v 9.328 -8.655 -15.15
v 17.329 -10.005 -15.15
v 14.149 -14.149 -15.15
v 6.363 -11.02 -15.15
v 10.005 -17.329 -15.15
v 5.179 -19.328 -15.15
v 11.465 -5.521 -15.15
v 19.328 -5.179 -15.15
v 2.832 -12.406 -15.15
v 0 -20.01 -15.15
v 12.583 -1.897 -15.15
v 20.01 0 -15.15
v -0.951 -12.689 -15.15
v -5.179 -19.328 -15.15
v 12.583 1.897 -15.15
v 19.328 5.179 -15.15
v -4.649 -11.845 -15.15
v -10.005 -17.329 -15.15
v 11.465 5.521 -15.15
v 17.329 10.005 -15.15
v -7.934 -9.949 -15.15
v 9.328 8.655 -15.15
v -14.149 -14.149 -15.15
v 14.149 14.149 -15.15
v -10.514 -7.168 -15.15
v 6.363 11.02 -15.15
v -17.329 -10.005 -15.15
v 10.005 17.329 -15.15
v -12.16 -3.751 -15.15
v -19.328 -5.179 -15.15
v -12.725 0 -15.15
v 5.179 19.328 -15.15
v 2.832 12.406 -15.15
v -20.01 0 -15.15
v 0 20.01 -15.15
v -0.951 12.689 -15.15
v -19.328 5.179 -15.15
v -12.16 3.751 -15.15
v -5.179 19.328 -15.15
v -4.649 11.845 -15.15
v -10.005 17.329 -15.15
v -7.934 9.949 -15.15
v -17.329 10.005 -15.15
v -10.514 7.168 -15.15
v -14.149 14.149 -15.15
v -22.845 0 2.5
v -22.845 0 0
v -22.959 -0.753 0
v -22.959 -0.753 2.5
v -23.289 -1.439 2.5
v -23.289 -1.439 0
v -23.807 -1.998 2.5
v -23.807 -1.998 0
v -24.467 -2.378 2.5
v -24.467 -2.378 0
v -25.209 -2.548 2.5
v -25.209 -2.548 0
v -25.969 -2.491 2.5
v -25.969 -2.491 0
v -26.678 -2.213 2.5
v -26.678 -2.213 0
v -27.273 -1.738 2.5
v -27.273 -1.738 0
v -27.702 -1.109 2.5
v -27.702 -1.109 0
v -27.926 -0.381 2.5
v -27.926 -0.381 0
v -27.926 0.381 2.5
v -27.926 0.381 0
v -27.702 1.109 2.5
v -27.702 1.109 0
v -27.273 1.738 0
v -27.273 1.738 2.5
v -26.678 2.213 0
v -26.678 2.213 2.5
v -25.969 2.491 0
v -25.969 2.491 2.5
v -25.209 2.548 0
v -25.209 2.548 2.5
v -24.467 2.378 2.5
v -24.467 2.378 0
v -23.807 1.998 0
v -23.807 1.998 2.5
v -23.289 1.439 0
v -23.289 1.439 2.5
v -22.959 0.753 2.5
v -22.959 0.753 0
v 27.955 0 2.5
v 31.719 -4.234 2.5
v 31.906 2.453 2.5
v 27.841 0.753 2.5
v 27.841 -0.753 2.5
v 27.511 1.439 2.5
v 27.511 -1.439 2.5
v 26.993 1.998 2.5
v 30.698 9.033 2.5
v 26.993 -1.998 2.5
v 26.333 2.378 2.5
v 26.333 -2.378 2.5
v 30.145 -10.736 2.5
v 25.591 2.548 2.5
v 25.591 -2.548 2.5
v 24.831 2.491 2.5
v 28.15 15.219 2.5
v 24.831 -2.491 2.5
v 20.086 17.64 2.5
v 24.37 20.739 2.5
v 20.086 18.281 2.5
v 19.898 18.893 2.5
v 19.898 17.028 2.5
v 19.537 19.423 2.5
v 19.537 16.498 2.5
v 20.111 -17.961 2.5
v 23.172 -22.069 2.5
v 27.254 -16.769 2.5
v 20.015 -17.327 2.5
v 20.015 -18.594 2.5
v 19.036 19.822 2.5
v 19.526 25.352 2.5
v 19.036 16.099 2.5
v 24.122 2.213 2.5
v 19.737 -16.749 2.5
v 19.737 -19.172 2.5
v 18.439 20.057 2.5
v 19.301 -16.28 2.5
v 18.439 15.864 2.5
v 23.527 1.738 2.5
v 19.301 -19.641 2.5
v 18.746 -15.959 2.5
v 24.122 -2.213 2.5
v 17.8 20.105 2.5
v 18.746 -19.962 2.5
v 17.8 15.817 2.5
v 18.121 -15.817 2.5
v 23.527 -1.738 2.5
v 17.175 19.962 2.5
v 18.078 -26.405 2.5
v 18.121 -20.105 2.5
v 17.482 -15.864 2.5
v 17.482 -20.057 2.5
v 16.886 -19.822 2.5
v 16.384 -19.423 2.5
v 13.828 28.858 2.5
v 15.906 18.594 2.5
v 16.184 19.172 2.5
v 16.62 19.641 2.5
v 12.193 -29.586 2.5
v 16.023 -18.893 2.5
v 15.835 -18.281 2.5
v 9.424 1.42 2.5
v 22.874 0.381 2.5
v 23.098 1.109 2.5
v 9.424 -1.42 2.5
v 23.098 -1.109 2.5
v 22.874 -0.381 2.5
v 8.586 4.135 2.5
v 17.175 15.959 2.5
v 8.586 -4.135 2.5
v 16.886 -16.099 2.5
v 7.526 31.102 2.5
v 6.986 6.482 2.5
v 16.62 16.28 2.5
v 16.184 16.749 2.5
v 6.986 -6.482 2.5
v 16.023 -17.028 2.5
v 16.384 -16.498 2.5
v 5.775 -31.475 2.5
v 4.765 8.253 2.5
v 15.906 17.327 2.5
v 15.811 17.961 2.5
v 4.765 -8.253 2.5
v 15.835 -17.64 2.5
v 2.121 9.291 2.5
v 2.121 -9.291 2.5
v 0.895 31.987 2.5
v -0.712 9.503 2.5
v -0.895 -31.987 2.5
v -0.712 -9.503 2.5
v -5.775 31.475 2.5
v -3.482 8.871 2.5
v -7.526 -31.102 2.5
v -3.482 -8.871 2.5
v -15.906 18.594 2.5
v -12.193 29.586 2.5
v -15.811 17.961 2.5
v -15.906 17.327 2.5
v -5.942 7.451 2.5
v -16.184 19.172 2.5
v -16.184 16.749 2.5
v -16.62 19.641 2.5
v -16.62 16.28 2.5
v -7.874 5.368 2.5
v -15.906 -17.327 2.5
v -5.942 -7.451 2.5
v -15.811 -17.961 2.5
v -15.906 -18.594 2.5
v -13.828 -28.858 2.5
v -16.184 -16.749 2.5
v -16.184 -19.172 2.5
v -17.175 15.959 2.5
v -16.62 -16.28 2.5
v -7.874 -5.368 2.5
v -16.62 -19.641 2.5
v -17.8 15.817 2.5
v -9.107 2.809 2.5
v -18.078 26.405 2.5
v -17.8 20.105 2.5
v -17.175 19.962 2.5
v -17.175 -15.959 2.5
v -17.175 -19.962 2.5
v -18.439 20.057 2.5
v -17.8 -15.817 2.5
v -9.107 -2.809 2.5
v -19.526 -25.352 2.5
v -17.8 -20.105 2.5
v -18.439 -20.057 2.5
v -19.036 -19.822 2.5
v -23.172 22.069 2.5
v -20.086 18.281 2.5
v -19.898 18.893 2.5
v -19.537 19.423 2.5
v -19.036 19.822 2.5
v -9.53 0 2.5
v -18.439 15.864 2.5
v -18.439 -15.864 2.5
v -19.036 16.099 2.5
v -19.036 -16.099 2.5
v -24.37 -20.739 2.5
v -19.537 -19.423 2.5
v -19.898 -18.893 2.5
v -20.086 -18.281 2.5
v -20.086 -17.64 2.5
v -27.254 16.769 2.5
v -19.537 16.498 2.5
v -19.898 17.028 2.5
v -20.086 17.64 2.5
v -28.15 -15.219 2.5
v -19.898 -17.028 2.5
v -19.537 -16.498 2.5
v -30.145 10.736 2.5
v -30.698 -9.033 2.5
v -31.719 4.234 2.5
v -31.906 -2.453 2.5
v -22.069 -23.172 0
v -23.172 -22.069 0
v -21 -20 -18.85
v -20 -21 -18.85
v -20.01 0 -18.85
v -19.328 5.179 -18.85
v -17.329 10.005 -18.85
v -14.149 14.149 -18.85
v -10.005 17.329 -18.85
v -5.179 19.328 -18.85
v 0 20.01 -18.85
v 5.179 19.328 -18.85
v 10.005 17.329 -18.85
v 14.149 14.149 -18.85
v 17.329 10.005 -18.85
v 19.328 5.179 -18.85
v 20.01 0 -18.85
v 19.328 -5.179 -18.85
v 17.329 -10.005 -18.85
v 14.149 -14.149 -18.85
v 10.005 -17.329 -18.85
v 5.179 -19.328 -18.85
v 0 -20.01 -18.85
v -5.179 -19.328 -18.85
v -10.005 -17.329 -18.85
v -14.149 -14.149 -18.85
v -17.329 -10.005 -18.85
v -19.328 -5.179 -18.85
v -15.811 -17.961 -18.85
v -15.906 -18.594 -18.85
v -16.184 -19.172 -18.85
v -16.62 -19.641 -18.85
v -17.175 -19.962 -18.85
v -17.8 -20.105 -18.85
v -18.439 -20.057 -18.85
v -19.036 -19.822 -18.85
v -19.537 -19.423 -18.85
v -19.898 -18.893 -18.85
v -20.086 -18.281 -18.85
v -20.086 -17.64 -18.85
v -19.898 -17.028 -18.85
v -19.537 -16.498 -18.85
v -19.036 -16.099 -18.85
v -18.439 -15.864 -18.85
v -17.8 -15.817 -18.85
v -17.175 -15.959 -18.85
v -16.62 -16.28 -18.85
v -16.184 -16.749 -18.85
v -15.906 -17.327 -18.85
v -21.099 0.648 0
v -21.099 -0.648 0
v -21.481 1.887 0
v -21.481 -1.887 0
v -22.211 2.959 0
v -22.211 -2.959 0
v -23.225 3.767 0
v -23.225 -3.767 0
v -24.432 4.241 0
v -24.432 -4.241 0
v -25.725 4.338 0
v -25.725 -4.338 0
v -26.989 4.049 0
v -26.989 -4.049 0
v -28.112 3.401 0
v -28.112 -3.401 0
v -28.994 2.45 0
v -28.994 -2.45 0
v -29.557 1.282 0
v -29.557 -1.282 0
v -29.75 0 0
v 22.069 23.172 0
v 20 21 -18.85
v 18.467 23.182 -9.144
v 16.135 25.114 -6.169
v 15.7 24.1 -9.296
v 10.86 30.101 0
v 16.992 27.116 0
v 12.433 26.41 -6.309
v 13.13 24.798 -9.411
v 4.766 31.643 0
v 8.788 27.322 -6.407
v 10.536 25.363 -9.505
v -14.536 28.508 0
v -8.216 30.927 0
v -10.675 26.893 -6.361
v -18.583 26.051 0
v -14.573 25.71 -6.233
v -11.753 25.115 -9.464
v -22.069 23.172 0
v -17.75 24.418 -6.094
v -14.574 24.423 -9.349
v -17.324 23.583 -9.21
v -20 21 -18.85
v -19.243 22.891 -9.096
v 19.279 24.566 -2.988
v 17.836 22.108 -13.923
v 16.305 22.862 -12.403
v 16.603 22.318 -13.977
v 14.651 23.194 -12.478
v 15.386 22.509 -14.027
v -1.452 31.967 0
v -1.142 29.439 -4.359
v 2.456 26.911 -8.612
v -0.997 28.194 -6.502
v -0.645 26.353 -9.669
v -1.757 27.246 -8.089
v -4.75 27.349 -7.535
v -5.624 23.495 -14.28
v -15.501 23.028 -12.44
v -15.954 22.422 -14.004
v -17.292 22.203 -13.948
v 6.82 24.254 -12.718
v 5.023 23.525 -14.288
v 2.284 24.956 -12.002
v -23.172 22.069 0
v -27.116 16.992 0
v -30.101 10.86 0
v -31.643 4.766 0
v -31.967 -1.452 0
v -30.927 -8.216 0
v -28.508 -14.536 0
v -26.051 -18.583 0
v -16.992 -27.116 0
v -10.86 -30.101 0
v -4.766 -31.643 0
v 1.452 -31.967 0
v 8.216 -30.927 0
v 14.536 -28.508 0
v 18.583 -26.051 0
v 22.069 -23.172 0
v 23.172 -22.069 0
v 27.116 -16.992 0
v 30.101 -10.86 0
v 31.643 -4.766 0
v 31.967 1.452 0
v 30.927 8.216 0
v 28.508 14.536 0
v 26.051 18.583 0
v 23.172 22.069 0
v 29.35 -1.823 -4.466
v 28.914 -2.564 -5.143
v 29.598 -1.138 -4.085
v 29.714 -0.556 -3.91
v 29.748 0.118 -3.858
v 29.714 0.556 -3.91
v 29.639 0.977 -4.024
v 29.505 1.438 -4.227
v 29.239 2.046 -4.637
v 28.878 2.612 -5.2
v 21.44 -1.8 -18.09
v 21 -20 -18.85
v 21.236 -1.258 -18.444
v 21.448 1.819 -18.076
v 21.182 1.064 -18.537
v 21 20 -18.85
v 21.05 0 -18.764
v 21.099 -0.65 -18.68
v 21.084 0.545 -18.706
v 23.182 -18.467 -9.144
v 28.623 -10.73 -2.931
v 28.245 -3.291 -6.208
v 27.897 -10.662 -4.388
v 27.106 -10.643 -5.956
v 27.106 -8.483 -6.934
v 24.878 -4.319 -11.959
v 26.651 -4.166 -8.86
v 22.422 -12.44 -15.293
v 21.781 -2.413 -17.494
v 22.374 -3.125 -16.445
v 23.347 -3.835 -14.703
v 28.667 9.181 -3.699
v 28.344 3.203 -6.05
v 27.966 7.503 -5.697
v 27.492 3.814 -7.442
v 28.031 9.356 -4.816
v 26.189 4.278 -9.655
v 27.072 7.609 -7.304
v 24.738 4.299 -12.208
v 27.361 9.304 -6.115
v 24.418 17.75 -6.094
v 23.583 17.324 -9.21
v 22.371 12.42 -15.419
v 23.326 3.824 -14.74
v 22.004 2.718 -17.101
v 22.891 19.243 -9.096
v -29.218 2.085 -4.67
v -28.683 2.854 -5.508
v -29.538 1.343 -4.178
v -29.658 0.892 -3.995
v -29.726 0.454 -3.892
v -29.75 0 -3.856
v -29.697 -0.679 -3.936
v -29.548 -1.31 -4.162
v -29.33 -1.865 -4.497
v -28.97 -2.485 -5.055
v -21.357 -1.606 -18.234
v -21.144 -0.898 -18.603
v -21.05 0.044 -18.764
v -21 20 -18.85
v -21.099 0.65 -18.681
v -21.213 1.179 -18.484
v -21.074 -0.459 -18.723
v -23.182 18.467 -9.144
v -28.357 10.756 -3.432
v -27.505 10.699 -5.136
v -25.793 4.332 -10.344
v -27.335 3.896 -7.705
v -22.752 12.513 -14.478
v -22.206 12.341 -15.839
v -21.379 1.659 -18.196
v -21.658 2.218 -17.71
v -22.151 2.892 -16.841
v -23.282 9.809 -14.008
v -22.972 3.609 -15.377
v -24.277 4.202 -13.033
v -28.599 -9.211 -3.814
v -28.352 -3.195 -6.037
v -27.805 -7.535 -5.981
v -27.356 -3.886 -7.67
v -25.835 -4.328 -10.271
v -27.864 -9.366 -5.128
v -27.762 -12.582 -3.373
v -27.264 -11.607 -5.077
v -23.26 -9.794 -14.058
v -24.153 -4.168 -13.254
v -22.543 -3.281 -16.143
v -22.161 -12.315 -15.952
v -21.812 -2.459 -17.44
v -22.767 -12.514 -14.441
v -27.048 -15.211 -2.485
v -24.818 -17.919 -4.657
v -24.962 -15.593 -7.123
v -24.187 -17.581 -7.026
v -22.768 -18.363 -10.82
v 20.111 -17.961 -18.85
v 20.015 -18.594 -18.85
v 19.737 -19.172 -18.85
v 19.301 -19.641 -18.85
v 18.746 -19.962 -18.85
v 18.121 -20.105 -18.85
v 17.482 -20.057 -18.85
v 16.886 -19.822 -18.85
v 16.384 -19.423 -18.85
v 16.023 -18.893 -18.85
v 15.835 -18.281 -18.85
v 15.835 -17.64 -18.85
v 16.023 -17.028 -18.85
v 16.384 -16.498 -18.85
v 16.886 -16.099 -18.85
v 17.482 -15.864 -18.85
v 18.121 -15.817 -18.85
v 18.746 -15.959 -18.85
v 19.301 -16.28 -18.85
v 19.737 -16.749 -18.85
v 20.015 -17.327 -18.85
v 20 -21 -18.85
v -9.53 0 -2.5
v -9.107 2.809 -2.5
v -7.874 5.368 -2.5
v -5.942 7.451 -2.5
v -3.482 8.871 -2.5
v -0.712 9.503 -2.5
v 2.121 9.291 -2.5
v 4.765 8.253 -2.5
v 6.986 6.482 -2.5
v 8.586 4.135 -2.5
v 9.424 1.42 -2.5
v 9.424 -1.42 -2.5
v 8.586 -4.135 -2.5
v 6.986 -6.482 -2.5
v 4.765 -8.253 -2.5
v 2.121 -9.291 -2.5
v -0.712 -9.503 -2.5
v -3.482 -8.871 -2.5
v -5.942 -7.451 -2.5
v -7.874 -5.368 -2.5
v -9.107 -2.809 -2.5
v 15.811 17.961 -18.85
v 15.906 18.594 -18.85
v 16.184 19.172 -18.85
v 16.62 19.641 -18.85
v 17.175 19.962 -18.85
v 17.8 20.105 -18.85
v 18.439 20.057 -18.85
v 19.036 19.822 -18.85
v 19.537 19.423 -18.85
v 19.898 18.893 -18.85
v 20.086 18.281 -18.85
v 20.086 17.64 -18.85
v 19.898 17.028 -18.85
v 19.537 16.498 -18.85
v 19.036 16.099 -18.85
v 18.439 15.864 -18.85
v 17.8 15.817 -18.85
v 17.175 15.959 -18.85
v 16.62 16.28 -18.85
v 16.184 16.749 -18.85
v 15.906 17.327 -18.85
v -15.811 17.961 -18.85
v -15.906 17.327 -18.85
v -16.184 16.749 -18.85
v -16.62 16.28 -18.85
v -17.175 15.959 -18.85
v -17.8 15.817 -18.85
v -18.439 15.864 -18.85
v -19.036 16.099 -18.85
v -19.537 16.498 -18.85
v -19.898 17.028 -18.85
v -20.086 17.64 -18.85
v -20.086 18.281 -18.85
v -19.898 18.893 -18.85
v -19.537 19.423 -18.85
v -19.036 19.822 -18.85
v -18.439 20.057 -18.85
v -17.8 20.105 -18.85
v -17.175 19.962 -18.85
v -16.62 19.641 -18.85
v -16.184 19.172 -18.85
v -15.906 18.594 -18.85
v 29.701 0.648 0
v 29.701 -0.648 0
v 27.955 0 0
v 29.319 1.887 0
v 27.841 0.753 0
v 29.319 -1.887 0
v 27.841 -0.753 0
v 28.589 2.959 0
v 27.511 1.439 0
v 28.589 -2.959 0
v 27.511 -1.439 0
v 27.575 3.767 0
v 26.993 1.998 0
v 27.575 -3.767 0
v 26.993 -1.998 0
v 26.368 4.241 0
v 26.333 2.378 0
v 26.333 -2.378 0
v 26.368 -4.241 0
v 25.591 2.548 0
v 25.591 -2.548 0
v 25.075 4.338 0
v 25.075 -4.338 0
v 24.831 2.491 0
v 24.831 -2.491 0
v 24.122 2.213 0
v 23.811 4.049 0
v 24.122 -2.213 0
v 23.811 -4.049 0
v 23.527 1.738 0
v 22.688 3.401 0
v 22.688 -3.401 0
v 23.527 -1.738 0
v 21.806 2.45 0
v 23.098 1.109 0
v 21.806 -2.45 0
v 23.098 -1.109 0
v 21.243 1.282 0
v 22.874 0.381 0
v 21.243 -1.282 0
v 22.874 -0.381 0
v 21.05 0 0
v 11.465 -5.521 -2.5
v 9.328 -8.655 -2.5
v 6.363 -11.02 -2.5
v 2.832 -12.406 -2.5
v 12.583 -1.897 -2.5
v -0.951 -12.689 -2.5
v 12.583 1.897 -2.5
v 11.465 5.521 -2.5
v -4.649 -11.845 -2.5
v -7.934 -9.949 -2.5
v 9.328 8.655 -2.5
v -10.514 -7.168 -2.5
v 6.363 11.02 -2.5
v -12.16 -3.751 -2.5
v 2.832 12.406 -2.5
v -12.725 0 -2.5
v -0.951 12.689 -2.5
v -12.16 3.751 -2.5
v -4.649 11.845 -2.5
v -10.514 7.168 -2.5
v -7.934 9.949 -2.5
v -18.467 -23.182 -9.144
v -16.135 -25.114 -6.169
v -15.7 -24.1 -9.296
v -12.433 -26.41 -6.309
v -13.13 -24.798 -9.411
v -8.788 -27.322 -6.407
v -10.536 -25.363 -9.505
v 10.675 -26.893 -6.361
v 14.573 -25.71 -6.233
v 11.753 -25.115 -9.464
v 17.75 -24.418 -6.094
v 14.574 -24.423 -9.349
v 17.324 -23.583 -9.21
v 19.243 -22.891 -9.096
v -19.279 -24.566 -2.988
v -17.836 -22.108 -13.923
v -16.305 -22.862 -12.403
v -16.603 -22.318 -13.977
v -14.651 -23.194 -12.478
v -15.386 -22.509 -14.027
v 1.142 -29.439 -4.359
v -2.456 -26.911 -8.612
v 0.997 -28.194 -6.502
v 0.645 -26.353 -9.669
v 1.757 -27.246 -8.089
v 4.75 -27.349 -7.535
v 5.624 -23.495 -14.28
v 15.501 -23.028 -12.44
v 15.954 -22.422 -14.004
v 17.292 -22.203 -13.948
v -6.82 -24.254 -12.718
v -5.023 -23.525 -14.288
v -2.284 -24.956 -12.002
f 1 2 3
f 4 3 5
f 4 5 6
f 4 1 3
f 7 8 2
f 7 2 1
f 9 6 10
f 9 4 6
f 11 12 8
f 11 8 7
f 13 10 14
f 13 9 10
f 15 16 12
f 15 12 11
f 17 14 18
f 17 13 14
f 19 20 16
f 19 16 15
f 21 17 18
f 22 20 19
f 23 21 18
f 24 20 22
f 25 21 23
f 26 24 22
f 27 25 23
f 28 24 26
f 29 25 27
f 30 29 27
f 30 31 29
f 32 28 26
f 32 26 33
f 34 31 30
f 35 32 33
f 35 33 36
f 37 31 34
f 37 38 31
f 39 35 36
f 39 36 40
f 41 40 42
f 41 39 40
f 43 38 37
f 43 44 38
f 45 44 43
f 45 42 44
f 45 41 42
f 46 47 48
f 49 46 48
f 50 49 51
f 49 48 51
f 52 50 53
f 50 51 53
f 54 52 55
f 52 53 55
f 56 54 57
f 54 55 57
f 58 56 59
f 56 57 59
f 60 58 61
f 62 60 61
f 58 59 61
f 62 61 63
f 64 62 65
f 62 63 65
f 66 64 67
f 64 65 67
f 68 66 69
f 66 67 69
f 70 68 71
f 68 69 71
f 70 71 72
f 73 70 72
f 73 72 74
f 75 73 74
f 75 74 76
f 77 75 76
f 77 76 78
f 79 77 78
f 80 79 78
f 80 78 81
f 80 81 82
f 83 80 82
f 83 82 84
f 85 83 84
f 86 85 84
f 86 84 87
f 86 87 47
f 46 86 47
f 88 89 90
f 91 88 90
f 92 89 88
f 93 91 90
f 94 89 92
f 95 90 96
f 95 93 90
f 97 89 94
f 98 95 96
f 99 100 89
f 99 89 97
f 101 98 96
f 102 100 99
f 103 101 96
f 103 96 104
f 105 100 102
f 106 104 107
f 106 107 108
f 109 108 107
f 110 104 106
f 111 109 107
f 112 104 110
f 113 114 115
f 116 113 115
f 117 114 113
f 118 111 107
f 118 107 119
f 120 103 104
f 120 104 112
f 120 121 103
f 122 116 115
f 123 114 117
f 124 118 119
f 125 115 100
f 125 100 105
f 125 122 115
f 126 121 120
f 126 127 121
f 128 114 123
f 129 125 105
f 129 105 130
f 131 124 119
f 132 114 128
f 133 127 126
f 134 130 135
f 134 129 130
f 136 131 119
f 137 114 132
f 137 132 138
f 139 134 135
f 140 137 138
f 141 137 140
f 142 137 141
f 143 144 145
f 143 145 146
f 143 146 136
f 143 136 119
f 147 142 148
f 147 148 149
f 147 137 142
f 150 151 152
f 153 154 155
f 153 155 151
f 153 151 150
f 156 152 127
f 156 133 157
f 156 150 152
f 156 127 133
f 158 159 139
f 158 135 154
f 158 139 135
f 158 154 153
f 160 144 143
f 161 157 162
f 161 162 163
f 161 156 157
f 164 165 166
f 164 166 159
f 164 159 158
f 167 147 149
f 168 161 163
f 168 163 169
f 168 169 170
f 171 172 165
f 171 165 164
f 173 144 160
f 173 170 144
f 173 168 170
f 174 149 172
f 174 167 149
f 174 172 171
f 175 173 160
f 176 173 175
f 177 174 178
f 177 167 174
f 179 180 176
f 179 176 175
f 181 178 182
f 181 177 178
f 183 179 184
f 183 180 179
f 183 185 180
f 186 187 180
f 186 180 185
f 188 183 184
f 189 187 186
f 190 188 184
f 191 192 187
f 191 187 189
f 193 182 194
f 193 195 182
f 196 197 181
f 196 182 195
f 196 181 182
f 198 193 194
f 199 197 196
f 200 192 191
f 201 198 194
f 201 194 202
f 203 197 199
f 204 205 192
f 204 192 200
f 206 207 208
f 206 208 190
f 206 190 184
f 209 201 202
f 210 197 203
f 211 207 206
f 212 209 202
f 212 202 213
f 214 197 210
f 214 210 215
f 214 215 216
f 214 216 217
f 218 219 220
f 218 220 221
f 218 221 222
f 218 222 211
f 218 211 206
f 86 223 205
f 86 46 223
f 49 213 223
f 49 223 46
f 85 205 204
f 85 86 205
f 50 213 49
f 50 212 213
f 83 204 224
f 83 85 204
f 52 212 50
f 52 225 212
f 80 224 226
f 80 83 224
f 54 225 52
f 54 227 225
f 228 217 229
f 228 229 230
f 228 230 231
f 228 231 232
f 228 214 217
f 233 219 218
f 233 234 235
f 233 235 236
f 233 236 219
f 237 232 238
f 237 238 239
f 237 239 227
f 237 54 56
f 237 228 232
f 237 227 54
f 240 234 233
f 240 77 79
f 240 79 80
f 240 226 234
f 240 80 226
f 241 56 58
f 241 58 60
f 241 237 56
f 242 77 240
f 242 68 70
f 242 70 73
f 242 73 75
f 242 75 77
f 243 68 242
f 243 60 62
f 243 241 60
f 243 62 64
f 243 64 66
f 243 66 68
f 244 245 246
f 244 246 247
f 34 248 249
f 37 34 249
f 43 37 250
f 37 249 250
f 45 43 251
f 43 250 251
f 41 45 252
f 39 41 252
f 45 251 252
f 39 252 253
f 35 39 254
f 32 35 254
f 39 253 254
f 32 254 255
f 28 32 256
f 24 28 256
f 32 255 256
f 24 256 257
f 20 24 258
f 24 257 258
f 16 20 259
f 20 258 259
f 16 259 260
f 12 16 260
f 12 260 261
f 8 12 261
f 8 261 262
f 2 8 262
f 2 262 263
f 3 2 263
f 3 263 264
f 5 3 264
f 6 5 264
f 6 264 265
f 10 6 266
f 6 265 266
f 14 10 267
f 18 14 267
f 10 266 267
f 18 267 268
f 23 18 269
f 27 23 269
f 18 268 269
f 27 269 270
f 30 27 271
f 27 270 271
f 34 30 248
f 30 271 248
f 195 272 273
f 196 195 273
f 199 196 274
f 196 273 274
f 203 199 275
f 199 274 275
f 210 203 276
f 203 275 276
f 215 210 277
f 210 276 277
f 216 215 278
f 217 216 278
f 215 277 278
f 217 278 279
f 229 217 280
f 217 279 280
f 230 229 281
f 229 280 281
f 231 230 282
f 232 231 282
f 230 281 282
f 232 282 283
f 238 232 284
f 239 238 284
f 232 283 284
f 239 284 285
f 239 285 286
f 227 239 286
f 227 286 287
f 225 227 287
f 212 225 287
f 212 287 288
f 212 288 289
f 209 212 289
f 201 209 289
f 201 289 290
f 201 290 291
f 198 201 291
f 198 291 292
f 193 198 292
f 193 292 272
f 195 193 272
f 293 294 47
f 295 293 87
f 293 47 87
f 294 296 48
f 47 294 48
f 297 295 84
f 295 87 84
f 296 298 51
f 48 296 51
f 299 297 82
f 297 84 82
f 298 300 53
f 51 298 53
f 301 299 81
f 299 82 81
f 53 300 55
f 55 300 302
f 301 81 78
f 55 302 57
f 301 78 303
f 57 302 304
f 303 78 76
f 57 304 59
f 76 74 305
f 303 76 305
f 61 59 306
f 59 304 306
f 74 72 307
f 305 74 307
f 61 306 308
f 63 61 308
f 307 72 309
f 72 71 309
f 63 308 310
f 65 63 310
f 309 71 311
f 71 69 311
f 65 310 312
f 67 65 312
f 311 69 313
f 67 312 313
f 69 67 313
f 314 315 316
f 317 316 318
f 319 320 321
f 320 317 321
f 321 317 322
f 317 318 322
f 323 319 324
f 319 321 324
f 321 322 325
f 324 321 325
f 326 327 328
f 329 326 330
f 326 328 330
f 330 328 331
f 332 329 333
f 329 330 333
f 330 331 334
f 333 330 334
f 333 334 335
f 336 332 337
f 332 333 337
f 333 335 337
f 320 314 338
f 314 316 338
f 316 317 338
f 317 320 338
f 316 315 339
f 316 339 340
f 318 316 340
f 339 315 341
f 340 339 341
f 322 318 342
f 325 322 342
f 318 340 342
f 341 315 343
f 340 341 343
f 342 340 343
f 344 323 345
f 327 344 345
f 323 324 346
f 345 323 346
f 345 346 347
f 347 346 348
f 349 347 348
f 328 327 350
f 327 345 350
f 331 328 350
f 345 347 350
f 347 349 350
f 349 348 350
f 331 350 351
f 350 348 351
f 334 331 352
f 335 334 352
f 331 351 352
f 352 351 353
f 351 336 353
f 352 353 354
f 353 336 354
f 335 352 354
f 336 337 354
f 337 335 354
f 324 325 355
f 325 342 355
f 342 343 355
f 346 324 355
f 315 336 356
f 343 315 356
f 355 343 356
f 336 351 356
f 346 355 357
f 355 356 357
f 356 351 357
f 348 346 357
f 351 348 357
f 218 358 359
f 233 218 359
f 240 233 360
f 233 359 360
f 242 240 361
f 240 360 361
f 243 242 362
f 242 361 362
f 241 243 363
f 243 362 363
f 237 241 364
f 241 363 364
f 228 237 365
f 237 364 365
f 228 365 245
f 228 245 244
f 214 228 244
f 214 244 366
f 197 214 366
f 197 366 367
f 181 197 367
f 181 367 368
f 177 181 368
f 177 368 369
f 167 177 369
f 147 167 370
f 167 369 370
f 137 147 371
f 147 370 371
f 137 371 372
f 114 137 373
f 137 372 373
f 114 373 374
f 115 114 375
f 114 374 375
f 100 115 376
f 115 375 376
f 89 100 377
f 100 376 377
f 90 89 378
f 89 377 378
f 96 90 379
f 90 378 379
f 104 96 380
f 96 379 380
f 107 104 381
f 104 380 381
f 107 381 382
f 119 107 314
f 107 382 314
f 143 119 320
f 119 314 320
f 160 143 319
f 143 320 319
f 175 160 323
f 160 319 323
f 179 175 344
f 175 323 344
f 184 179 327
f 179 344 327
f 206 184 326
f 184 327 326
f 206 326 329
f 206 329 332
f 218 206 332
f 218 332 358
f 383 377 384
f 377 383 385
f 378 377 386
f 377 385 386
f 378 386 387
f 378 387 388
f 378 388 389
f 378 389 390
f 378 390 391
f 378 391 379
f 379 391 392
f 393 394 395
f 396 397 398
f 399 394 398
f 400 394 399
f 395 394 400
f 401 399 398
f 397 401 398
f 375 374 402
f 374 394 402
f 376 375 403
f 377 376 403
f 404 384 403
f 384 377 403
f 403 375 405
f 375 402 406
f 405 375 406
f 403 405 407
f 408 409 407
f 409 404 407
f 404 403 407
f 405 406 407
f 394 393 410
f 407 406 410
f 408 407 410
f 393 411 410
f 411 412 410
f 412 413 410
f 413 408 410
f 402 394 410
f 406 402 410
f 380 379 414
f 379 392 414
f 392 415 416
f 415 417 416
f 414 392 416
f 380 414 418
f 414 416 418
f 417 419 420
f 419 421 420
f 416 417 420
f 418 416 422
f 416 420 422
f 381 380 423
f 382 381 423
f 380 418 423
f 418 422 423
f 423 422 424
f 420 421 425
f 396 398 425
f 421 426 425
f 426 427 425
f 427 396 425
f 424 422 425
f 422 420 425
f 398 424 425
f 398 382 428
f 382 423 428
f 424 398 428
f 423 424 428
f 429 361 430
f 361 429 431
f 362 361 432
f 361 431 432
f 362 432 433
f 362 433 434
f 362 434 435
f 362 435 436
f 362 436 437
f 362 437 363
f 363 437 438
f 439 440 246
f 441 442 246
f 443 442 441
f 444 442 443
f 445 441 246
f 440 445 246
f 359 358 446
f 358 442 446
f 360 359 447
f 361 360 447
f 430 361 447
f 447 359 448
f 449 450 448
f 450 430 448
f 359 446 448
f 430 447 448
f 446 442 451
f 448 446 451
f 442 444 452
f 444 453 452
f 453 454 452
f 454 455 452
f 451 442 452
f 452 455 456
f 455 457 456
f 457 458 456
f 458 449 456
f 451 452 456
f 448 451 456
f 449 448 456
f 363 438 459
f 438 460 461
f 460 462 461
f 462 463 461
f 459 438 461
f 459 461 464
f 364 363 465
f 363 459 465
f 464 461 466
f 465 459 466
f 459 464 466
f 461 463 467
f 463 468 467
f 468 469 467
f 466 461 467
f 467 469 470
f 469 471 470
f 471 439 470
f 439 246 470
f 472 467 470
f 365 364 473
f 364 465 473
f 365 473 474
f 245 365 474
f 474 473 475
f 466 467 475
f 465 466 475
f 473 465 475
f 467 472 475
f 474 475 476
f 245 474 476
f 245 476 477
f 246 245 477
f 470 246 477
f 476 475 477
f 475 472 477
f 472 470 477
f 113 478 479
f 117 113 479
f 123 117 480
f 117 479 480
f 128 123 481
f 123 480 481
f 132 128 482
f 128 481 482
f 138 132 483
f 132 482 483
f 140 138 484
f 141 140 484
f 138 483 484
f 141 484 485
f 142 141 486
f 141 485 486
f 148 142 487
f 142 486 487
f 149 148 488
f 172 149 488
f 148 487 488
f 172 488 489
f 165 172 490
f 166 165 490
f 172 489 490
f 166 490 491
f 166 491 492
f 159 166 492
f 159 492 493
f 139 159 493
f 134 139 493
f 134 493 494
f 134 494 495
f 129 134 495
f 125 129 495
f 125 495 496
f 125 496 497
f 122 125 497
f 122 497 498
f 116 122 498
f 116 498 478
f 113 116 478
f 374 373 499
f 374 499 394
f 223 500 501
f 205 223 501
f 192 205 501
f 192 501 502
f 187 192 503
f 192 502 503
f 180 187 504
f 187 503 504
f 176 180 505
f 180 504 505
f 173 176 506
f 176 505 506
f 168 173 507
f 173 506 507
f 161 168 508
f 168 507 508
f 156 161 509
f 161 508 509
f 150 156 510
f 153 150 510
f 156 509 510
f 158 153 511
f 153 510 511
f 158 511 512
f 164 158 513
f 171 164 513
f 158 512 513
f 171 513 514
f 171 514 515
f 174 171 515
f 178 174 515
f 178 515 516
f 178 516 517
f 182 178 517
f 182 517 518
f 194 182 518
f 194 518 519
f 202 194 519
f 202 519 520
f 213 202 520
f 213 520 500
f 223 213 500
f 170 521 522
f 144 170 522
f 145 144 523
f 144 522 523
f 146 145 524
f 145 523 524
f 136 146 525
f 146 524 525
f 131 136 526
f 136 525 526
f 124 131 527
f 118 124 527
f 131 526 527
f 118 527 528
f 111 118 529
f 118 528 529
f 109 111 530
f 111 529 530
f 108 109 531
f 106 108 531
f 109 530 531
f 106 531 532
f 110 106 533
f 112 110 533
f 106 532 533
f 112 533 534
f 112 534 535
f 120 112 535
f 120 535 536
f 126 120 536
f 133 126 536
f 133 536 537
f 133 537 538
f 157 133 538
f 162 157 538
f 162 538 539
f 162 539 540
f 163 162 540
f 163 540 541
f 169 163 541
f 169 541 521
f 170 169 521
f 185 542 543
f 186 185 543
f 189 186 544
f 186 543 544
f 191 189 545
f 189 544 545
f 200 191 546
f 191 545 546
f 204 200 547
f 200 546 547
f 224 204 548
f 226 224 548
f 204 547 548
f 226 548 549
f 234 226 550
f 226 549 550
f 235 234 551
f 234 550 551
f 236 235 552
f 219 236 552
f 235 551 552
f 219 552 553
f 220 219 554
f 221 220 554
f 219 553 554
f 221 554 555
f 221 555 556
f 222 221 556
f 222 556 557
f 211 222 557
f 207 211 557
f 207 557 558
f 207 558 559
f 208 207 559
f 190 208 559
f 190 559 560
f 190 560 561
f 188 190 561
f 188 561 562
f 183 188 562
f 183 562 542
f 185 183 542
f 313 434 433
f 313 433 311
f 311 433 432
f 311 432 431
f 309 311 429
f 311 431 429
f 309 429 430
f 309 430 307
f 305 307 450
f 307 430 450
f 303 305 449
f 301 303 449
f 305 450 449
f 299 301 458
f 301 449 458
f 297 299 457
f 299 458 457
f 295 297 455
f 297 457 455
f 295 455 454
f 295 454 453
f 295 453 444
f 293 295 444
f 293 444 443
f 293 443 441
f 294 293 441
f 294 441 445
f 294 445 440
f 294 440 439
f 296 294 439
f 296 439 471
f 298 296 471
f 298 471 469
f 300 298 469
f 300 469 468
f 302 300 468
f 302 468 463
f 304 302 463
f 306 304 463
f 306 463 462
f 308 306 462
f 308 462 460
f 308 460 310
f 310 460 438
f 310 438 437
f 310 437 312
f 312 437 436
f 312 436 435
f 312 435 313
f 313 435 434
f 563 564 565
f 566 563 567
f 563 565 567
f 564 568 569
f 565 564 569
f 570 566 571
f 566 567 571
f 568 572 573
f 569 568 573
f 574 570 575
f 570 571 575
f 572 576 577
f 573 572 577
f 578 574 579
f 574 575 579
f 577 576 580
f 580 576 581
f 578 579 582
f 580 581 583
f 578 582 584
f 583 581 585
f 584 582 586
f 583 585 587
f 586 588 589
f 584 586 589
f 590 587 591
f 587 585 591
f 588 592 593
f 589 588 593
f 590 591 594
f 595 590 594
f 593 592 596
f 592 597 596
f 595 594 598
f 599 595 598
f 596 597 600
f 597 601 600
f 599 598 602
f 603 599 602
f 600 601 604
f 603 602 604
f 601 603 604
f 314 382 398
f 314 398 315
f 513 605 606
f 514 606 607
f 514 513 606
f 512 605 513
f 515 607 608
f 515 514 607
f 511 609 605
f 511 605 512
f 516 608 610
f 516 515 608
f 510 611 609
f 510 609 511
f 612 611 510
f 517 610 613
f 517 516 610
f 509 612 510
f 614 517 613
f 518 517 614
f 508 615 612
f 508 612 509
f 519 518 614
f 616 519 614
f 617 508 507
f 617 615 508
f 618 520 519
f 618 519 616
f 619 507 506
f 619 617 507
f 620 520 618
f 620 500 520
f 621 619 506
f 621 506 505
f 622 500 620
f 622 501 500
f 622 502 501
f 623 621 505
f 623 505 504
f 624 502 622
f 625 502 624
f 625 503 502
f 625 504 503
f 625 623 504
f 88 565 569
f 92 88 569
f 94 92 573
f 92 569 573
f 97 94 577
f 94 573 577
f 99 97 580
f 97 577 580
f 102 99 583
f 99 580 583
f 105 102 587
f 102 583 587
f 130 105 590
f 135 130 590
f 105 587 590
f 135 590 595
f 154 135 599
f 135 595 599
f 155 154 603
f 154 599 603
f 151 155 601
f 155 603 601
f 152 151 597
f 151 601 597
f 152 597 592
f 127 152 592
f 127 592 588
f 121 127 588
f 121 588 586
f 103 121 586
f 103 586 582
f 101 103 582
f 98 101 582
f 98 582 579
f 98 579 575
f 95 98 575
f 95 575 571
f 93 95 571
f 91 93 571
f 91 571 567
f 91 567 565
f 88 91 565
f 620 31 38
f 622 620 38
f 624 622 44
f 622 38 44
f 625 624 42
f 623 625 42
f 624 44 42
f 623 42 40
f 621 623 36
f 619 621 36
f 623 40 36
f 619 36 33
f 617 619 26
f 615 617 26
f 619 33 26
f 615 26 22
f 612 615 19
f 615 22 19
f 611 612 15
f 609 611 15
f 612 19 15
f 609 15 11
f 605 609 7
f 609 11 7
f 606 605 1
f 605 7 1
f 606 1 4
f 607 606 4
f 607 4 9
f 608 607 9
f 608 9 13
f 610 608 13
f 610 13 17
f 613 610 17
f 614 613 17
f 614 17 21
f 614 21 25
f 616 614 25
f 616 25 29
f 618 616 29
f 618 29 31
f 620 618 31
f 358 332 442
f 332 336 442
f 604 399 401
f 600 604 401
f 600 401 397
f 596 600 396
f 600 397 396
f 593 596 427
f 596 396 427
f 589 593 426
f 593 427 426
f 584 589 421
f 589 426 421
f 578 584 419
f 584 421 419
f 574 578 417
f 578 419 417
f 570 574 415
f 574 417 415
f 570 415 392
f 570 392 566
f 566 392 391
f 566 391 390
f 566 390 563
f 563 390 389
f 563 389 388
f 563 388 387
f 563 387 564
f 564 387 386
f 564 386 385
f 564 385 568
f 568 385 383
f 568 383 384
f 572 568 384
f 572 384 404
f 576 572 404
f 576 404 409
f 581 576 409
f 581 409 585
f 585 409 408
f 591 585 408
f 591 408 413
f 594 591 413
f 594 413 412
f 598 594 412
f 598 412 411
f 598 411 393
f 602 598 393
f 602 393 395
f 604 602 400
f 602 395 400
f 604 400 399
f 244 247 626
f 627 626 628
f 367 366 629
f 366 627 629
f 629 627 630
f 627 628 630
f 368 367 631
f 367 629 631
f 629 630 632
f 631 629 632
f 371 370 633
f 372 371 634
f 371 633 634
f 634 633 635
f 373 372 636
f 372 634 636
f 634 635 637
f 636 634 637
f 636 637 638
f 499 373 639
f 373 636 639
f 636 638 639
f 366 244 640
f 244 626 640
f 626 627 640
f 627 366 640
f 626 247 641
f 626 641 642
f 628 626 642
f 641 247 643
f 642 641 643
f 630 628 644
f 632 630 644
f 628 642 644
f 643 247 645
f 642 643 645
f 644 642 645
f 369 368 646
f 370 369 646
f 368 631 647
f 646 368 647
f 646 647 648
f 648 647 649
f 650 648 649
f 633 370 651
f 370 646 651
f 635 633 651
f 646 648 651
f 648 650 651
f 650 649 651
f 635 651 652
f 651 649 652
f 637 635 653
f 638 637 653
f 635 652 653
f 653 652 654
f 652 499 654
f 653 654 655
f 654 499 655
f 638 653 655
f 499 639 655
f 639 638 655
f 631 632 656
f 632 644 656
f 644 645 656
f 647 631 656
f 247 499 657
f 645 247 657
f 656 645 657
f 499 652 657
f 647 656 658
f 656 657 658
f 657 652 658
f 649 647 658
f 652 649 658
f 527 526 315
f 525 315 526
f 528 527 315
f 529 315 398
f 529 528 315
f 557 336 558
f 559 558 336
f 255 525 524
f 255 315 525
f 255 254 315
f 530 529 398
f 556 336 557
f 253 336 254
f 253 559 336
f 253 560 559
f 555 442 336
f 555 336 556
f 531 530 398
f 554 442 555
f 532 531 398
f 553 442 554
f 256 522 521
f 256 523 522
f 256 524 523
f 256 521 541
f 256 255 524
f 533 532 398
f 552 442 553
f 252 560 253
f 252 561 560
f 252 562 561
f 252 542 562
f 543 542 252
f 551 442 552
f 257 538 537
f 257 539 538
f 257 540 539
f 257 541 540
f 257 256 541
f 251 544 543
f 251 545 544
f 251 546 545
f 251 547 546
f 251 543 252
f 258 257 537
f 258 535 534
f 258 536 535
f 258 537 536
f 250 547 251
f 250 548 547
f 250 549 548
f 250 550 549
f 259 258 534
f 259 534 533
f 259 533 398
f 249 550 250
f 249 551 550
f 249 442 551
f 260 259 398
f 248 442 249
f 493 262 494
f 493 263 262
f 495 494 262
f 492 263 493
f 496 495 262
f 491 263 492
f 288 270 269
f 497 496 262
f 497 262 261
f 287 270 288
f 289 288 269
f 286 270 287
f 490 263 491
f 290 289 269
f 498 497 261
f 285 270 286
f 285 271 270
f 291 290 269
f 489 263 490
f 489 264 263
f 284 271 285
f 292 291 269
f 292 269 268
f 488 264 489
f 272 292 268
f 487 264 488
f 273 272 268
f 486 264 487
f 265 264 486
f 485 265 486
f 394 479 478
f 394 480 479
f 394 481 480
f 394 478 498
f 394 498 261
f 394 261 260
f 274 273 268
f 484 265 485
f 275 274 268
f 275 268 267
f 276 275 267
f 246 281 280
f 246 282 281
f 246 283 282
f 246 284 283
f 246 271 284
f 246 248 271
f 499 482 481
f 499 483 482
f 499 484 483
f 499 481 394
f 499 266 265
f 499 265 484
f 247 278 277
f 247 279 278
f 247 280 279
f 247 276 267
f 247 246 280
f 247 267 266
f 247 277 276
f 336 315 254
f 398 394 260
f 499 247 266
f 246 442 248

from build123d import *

# Parameters (mm, degrees)
SKETCH3_R           = 4.35
CUT_EXTRUDE1_DEPTH  = 19.35
SKETCH4_R           = 32
BOSS_EXTRUDE1_DEPTH = 2.5
SKETCH5_R           = 2.555
CUT_EXTRUDE2_DEPTH  = 40
SKETCH6_R           = 20.01
CUT_EXTRUDE3_DEPTH  = 3.7
SKETCH7_R           = 12.725
CUT_EXTRUDE4_DEPTH  = 16.35
SKETCH8_R           = 9.53
CUT_EXTRUDE5_DEPTH  = 16.35
SKETCH9_R           = 2.15
CUT_EXTRUDE6_DEPTH  = 30


with BuildPart() as part:
    # Sketch1 for Loft3 → Loft3 section 0
    with BuildSketch(Plane.XY):
        with BuildLine():
            # circular arc as an exact rational Bezier (weights 1, cos(half-angle), 1)
            Bezier((-22.068965517, 23.172413793), (-22.634146342, 22.634146342), (-23.172413793, 22.068965517), weights=[1, 0.999702691, 1])
            Bezier((-23.172413793, 22.068965517), (-44.190476191, 0), (-23.172413793, -22.068965517), weights=[1, 0.724137931, 1])
            Bezier((-23.172413793, -22.068965517), (-22.634146342, -22.634146342), (-22.068965517, -23.172413793), weights=[1, 0.999702691, 1])
            Bezier((-22.068965517, -23.172413793), (0, -44.190476191), (22.068965517, -23.172413793), weights=[1, 0.724137931, 1])
            Bezier((22.068965517, -23.172413793), (22.634146342, -22.634146342), (23.172413793, -22.068965517), weights=[1, 0.999702691, 1])
            Bezier((23.172413793, -22.068965517), (44.190476191, 0), (23.172413793, 22.068965517), weights=[1, 0.724137931, 1])
            Bezier((23.172413793, 22.068965517), (22.634146342, 22.634146342), (22.068965517, 23.172413793), weights=[1, 0.999702691, 1])
            Bezier((22.068965517, 23.172413793), (0, 44.190476191), (-22.068965517, 23.172413793), weights=[1, 0.724137931, 1])
        make_face()
    # Sketch2 → Loft3 section 1
    with BuildSketch(Plane(origin=(0, 0, -18.85), x_dir=(-1, 0, 0), z_dir=(0, 0, -1))):
        Polygon((20, 21), (21, 20), (21, -20), (20, -21), (-20, -21), (-21, -20), (-21, 20), (-20, 21), align=None)
    loft()

    # Sketch3 → Cut-Extrude1 (cut)
    with BuildSketch(Plane(origin=(0, 0, -18.85), x_dir=(-1, 0, 0), z_dir=(0, 0, -1))):
        with Locations((25.4, 0)):
            Circle(SKETCH3_R)
        with Locations((-25.4, 0)):
            Circle(SKETCH3_R)
    extrude(amount=-CUT_EXTRUDE1_DEPTH, mode=Mode.SUBTRACT)

    # Sketch4 → Boss-Extrude1 (add)
    with BuildSketch(Plane.XY):
        with Locations(Location((0, 0, 0), (0, 0, 136.397181012))):
            Circle(SKETCH4_R)
    extrude(amount=BOSS_EXTRUDE1_DEPTH)

    # Sketch5 → Cut-Extrude2 (cut)
    with BuildSketch(Plane(origin=(0, 0, -18.85), x_dir=(-1, 0, 0), z_dir=(0, 0, -1))):
        with Locations(Location((25.4, 0, 0), (0, 0, 180))):
            Circle(SKETCH5_R)
        with Locations(Location((-25.4, 0, 0), (0, 0, 180))):
            Circle(SKETCH5_R)
    extrude(amount=-CUT_EXTRUDE2_DEPTH, mode=Mode.SUBTRACT)

    # Sketch6 → Cut-Extrude3 (cut)
    with BuildSketch(Plane(origin=(0, 0, -18.85), x_dir=(-1, 0, 0), z_dir=(0, 0, -1))):
        Circle(SKETCH6_R)
    extrude(amount=-CUT_EXTRUDE3_DEPTH, mode=Mode.SUBTRACT)

    # Sketch7 → Cut-Extrude4 (cut)
    with BuildSketch(Plane(origin=(0, 0, -18.85), x_dir=(-1, 0, 0), z_dir=(0, 0, -1))):
        Circle(SKETCH7_R)
    extrude(amount=-CUT_EXTRUDE4_DEPTH, mode=Mode.SUBTRACT)

    # Sketch8 → Cut-Extrude5 (cut)
    with BuildSketch(Plane(origin=(0, 0, -2.5), x_dir=(-1, 0, 0), z_dir=(0, 0, -1))):
        Circle(SKETCH8_R)
    extrude(amount=-CUT_EXTRUDE5_DEPTH, mode=Mode.SUBTRACT)

    # Sketch9 → Cut-Extrude6 (cut)
    with BuildSketch(Plane(origin=(0, 0, -18.85), x_dir=(-1, 0, 0), z_dir=(0, 0, -1))):
        with Locations((-17.960512242, 17.960512242)):
            Circle(SKETCH9_R)
        with Locations(Location((17.960512242, 17.960512242, 0), (0, 0, 180))):
            Circle(SKETCH9_R)
        with Locations(Location((-17.960512242, -17.960512242, 0), (0, 0, 180))):
            Circle(SKETCH9_R)
        with Locations(Location((17.960512242, -17.960512242, 0), (0, 0, 180))):
            Circle(SKETCH9_R)
    extrude(amount=-CUT_EXTRUDE6_DEPTH, mode=Mode.SUBTRACT)


solid = part.part
